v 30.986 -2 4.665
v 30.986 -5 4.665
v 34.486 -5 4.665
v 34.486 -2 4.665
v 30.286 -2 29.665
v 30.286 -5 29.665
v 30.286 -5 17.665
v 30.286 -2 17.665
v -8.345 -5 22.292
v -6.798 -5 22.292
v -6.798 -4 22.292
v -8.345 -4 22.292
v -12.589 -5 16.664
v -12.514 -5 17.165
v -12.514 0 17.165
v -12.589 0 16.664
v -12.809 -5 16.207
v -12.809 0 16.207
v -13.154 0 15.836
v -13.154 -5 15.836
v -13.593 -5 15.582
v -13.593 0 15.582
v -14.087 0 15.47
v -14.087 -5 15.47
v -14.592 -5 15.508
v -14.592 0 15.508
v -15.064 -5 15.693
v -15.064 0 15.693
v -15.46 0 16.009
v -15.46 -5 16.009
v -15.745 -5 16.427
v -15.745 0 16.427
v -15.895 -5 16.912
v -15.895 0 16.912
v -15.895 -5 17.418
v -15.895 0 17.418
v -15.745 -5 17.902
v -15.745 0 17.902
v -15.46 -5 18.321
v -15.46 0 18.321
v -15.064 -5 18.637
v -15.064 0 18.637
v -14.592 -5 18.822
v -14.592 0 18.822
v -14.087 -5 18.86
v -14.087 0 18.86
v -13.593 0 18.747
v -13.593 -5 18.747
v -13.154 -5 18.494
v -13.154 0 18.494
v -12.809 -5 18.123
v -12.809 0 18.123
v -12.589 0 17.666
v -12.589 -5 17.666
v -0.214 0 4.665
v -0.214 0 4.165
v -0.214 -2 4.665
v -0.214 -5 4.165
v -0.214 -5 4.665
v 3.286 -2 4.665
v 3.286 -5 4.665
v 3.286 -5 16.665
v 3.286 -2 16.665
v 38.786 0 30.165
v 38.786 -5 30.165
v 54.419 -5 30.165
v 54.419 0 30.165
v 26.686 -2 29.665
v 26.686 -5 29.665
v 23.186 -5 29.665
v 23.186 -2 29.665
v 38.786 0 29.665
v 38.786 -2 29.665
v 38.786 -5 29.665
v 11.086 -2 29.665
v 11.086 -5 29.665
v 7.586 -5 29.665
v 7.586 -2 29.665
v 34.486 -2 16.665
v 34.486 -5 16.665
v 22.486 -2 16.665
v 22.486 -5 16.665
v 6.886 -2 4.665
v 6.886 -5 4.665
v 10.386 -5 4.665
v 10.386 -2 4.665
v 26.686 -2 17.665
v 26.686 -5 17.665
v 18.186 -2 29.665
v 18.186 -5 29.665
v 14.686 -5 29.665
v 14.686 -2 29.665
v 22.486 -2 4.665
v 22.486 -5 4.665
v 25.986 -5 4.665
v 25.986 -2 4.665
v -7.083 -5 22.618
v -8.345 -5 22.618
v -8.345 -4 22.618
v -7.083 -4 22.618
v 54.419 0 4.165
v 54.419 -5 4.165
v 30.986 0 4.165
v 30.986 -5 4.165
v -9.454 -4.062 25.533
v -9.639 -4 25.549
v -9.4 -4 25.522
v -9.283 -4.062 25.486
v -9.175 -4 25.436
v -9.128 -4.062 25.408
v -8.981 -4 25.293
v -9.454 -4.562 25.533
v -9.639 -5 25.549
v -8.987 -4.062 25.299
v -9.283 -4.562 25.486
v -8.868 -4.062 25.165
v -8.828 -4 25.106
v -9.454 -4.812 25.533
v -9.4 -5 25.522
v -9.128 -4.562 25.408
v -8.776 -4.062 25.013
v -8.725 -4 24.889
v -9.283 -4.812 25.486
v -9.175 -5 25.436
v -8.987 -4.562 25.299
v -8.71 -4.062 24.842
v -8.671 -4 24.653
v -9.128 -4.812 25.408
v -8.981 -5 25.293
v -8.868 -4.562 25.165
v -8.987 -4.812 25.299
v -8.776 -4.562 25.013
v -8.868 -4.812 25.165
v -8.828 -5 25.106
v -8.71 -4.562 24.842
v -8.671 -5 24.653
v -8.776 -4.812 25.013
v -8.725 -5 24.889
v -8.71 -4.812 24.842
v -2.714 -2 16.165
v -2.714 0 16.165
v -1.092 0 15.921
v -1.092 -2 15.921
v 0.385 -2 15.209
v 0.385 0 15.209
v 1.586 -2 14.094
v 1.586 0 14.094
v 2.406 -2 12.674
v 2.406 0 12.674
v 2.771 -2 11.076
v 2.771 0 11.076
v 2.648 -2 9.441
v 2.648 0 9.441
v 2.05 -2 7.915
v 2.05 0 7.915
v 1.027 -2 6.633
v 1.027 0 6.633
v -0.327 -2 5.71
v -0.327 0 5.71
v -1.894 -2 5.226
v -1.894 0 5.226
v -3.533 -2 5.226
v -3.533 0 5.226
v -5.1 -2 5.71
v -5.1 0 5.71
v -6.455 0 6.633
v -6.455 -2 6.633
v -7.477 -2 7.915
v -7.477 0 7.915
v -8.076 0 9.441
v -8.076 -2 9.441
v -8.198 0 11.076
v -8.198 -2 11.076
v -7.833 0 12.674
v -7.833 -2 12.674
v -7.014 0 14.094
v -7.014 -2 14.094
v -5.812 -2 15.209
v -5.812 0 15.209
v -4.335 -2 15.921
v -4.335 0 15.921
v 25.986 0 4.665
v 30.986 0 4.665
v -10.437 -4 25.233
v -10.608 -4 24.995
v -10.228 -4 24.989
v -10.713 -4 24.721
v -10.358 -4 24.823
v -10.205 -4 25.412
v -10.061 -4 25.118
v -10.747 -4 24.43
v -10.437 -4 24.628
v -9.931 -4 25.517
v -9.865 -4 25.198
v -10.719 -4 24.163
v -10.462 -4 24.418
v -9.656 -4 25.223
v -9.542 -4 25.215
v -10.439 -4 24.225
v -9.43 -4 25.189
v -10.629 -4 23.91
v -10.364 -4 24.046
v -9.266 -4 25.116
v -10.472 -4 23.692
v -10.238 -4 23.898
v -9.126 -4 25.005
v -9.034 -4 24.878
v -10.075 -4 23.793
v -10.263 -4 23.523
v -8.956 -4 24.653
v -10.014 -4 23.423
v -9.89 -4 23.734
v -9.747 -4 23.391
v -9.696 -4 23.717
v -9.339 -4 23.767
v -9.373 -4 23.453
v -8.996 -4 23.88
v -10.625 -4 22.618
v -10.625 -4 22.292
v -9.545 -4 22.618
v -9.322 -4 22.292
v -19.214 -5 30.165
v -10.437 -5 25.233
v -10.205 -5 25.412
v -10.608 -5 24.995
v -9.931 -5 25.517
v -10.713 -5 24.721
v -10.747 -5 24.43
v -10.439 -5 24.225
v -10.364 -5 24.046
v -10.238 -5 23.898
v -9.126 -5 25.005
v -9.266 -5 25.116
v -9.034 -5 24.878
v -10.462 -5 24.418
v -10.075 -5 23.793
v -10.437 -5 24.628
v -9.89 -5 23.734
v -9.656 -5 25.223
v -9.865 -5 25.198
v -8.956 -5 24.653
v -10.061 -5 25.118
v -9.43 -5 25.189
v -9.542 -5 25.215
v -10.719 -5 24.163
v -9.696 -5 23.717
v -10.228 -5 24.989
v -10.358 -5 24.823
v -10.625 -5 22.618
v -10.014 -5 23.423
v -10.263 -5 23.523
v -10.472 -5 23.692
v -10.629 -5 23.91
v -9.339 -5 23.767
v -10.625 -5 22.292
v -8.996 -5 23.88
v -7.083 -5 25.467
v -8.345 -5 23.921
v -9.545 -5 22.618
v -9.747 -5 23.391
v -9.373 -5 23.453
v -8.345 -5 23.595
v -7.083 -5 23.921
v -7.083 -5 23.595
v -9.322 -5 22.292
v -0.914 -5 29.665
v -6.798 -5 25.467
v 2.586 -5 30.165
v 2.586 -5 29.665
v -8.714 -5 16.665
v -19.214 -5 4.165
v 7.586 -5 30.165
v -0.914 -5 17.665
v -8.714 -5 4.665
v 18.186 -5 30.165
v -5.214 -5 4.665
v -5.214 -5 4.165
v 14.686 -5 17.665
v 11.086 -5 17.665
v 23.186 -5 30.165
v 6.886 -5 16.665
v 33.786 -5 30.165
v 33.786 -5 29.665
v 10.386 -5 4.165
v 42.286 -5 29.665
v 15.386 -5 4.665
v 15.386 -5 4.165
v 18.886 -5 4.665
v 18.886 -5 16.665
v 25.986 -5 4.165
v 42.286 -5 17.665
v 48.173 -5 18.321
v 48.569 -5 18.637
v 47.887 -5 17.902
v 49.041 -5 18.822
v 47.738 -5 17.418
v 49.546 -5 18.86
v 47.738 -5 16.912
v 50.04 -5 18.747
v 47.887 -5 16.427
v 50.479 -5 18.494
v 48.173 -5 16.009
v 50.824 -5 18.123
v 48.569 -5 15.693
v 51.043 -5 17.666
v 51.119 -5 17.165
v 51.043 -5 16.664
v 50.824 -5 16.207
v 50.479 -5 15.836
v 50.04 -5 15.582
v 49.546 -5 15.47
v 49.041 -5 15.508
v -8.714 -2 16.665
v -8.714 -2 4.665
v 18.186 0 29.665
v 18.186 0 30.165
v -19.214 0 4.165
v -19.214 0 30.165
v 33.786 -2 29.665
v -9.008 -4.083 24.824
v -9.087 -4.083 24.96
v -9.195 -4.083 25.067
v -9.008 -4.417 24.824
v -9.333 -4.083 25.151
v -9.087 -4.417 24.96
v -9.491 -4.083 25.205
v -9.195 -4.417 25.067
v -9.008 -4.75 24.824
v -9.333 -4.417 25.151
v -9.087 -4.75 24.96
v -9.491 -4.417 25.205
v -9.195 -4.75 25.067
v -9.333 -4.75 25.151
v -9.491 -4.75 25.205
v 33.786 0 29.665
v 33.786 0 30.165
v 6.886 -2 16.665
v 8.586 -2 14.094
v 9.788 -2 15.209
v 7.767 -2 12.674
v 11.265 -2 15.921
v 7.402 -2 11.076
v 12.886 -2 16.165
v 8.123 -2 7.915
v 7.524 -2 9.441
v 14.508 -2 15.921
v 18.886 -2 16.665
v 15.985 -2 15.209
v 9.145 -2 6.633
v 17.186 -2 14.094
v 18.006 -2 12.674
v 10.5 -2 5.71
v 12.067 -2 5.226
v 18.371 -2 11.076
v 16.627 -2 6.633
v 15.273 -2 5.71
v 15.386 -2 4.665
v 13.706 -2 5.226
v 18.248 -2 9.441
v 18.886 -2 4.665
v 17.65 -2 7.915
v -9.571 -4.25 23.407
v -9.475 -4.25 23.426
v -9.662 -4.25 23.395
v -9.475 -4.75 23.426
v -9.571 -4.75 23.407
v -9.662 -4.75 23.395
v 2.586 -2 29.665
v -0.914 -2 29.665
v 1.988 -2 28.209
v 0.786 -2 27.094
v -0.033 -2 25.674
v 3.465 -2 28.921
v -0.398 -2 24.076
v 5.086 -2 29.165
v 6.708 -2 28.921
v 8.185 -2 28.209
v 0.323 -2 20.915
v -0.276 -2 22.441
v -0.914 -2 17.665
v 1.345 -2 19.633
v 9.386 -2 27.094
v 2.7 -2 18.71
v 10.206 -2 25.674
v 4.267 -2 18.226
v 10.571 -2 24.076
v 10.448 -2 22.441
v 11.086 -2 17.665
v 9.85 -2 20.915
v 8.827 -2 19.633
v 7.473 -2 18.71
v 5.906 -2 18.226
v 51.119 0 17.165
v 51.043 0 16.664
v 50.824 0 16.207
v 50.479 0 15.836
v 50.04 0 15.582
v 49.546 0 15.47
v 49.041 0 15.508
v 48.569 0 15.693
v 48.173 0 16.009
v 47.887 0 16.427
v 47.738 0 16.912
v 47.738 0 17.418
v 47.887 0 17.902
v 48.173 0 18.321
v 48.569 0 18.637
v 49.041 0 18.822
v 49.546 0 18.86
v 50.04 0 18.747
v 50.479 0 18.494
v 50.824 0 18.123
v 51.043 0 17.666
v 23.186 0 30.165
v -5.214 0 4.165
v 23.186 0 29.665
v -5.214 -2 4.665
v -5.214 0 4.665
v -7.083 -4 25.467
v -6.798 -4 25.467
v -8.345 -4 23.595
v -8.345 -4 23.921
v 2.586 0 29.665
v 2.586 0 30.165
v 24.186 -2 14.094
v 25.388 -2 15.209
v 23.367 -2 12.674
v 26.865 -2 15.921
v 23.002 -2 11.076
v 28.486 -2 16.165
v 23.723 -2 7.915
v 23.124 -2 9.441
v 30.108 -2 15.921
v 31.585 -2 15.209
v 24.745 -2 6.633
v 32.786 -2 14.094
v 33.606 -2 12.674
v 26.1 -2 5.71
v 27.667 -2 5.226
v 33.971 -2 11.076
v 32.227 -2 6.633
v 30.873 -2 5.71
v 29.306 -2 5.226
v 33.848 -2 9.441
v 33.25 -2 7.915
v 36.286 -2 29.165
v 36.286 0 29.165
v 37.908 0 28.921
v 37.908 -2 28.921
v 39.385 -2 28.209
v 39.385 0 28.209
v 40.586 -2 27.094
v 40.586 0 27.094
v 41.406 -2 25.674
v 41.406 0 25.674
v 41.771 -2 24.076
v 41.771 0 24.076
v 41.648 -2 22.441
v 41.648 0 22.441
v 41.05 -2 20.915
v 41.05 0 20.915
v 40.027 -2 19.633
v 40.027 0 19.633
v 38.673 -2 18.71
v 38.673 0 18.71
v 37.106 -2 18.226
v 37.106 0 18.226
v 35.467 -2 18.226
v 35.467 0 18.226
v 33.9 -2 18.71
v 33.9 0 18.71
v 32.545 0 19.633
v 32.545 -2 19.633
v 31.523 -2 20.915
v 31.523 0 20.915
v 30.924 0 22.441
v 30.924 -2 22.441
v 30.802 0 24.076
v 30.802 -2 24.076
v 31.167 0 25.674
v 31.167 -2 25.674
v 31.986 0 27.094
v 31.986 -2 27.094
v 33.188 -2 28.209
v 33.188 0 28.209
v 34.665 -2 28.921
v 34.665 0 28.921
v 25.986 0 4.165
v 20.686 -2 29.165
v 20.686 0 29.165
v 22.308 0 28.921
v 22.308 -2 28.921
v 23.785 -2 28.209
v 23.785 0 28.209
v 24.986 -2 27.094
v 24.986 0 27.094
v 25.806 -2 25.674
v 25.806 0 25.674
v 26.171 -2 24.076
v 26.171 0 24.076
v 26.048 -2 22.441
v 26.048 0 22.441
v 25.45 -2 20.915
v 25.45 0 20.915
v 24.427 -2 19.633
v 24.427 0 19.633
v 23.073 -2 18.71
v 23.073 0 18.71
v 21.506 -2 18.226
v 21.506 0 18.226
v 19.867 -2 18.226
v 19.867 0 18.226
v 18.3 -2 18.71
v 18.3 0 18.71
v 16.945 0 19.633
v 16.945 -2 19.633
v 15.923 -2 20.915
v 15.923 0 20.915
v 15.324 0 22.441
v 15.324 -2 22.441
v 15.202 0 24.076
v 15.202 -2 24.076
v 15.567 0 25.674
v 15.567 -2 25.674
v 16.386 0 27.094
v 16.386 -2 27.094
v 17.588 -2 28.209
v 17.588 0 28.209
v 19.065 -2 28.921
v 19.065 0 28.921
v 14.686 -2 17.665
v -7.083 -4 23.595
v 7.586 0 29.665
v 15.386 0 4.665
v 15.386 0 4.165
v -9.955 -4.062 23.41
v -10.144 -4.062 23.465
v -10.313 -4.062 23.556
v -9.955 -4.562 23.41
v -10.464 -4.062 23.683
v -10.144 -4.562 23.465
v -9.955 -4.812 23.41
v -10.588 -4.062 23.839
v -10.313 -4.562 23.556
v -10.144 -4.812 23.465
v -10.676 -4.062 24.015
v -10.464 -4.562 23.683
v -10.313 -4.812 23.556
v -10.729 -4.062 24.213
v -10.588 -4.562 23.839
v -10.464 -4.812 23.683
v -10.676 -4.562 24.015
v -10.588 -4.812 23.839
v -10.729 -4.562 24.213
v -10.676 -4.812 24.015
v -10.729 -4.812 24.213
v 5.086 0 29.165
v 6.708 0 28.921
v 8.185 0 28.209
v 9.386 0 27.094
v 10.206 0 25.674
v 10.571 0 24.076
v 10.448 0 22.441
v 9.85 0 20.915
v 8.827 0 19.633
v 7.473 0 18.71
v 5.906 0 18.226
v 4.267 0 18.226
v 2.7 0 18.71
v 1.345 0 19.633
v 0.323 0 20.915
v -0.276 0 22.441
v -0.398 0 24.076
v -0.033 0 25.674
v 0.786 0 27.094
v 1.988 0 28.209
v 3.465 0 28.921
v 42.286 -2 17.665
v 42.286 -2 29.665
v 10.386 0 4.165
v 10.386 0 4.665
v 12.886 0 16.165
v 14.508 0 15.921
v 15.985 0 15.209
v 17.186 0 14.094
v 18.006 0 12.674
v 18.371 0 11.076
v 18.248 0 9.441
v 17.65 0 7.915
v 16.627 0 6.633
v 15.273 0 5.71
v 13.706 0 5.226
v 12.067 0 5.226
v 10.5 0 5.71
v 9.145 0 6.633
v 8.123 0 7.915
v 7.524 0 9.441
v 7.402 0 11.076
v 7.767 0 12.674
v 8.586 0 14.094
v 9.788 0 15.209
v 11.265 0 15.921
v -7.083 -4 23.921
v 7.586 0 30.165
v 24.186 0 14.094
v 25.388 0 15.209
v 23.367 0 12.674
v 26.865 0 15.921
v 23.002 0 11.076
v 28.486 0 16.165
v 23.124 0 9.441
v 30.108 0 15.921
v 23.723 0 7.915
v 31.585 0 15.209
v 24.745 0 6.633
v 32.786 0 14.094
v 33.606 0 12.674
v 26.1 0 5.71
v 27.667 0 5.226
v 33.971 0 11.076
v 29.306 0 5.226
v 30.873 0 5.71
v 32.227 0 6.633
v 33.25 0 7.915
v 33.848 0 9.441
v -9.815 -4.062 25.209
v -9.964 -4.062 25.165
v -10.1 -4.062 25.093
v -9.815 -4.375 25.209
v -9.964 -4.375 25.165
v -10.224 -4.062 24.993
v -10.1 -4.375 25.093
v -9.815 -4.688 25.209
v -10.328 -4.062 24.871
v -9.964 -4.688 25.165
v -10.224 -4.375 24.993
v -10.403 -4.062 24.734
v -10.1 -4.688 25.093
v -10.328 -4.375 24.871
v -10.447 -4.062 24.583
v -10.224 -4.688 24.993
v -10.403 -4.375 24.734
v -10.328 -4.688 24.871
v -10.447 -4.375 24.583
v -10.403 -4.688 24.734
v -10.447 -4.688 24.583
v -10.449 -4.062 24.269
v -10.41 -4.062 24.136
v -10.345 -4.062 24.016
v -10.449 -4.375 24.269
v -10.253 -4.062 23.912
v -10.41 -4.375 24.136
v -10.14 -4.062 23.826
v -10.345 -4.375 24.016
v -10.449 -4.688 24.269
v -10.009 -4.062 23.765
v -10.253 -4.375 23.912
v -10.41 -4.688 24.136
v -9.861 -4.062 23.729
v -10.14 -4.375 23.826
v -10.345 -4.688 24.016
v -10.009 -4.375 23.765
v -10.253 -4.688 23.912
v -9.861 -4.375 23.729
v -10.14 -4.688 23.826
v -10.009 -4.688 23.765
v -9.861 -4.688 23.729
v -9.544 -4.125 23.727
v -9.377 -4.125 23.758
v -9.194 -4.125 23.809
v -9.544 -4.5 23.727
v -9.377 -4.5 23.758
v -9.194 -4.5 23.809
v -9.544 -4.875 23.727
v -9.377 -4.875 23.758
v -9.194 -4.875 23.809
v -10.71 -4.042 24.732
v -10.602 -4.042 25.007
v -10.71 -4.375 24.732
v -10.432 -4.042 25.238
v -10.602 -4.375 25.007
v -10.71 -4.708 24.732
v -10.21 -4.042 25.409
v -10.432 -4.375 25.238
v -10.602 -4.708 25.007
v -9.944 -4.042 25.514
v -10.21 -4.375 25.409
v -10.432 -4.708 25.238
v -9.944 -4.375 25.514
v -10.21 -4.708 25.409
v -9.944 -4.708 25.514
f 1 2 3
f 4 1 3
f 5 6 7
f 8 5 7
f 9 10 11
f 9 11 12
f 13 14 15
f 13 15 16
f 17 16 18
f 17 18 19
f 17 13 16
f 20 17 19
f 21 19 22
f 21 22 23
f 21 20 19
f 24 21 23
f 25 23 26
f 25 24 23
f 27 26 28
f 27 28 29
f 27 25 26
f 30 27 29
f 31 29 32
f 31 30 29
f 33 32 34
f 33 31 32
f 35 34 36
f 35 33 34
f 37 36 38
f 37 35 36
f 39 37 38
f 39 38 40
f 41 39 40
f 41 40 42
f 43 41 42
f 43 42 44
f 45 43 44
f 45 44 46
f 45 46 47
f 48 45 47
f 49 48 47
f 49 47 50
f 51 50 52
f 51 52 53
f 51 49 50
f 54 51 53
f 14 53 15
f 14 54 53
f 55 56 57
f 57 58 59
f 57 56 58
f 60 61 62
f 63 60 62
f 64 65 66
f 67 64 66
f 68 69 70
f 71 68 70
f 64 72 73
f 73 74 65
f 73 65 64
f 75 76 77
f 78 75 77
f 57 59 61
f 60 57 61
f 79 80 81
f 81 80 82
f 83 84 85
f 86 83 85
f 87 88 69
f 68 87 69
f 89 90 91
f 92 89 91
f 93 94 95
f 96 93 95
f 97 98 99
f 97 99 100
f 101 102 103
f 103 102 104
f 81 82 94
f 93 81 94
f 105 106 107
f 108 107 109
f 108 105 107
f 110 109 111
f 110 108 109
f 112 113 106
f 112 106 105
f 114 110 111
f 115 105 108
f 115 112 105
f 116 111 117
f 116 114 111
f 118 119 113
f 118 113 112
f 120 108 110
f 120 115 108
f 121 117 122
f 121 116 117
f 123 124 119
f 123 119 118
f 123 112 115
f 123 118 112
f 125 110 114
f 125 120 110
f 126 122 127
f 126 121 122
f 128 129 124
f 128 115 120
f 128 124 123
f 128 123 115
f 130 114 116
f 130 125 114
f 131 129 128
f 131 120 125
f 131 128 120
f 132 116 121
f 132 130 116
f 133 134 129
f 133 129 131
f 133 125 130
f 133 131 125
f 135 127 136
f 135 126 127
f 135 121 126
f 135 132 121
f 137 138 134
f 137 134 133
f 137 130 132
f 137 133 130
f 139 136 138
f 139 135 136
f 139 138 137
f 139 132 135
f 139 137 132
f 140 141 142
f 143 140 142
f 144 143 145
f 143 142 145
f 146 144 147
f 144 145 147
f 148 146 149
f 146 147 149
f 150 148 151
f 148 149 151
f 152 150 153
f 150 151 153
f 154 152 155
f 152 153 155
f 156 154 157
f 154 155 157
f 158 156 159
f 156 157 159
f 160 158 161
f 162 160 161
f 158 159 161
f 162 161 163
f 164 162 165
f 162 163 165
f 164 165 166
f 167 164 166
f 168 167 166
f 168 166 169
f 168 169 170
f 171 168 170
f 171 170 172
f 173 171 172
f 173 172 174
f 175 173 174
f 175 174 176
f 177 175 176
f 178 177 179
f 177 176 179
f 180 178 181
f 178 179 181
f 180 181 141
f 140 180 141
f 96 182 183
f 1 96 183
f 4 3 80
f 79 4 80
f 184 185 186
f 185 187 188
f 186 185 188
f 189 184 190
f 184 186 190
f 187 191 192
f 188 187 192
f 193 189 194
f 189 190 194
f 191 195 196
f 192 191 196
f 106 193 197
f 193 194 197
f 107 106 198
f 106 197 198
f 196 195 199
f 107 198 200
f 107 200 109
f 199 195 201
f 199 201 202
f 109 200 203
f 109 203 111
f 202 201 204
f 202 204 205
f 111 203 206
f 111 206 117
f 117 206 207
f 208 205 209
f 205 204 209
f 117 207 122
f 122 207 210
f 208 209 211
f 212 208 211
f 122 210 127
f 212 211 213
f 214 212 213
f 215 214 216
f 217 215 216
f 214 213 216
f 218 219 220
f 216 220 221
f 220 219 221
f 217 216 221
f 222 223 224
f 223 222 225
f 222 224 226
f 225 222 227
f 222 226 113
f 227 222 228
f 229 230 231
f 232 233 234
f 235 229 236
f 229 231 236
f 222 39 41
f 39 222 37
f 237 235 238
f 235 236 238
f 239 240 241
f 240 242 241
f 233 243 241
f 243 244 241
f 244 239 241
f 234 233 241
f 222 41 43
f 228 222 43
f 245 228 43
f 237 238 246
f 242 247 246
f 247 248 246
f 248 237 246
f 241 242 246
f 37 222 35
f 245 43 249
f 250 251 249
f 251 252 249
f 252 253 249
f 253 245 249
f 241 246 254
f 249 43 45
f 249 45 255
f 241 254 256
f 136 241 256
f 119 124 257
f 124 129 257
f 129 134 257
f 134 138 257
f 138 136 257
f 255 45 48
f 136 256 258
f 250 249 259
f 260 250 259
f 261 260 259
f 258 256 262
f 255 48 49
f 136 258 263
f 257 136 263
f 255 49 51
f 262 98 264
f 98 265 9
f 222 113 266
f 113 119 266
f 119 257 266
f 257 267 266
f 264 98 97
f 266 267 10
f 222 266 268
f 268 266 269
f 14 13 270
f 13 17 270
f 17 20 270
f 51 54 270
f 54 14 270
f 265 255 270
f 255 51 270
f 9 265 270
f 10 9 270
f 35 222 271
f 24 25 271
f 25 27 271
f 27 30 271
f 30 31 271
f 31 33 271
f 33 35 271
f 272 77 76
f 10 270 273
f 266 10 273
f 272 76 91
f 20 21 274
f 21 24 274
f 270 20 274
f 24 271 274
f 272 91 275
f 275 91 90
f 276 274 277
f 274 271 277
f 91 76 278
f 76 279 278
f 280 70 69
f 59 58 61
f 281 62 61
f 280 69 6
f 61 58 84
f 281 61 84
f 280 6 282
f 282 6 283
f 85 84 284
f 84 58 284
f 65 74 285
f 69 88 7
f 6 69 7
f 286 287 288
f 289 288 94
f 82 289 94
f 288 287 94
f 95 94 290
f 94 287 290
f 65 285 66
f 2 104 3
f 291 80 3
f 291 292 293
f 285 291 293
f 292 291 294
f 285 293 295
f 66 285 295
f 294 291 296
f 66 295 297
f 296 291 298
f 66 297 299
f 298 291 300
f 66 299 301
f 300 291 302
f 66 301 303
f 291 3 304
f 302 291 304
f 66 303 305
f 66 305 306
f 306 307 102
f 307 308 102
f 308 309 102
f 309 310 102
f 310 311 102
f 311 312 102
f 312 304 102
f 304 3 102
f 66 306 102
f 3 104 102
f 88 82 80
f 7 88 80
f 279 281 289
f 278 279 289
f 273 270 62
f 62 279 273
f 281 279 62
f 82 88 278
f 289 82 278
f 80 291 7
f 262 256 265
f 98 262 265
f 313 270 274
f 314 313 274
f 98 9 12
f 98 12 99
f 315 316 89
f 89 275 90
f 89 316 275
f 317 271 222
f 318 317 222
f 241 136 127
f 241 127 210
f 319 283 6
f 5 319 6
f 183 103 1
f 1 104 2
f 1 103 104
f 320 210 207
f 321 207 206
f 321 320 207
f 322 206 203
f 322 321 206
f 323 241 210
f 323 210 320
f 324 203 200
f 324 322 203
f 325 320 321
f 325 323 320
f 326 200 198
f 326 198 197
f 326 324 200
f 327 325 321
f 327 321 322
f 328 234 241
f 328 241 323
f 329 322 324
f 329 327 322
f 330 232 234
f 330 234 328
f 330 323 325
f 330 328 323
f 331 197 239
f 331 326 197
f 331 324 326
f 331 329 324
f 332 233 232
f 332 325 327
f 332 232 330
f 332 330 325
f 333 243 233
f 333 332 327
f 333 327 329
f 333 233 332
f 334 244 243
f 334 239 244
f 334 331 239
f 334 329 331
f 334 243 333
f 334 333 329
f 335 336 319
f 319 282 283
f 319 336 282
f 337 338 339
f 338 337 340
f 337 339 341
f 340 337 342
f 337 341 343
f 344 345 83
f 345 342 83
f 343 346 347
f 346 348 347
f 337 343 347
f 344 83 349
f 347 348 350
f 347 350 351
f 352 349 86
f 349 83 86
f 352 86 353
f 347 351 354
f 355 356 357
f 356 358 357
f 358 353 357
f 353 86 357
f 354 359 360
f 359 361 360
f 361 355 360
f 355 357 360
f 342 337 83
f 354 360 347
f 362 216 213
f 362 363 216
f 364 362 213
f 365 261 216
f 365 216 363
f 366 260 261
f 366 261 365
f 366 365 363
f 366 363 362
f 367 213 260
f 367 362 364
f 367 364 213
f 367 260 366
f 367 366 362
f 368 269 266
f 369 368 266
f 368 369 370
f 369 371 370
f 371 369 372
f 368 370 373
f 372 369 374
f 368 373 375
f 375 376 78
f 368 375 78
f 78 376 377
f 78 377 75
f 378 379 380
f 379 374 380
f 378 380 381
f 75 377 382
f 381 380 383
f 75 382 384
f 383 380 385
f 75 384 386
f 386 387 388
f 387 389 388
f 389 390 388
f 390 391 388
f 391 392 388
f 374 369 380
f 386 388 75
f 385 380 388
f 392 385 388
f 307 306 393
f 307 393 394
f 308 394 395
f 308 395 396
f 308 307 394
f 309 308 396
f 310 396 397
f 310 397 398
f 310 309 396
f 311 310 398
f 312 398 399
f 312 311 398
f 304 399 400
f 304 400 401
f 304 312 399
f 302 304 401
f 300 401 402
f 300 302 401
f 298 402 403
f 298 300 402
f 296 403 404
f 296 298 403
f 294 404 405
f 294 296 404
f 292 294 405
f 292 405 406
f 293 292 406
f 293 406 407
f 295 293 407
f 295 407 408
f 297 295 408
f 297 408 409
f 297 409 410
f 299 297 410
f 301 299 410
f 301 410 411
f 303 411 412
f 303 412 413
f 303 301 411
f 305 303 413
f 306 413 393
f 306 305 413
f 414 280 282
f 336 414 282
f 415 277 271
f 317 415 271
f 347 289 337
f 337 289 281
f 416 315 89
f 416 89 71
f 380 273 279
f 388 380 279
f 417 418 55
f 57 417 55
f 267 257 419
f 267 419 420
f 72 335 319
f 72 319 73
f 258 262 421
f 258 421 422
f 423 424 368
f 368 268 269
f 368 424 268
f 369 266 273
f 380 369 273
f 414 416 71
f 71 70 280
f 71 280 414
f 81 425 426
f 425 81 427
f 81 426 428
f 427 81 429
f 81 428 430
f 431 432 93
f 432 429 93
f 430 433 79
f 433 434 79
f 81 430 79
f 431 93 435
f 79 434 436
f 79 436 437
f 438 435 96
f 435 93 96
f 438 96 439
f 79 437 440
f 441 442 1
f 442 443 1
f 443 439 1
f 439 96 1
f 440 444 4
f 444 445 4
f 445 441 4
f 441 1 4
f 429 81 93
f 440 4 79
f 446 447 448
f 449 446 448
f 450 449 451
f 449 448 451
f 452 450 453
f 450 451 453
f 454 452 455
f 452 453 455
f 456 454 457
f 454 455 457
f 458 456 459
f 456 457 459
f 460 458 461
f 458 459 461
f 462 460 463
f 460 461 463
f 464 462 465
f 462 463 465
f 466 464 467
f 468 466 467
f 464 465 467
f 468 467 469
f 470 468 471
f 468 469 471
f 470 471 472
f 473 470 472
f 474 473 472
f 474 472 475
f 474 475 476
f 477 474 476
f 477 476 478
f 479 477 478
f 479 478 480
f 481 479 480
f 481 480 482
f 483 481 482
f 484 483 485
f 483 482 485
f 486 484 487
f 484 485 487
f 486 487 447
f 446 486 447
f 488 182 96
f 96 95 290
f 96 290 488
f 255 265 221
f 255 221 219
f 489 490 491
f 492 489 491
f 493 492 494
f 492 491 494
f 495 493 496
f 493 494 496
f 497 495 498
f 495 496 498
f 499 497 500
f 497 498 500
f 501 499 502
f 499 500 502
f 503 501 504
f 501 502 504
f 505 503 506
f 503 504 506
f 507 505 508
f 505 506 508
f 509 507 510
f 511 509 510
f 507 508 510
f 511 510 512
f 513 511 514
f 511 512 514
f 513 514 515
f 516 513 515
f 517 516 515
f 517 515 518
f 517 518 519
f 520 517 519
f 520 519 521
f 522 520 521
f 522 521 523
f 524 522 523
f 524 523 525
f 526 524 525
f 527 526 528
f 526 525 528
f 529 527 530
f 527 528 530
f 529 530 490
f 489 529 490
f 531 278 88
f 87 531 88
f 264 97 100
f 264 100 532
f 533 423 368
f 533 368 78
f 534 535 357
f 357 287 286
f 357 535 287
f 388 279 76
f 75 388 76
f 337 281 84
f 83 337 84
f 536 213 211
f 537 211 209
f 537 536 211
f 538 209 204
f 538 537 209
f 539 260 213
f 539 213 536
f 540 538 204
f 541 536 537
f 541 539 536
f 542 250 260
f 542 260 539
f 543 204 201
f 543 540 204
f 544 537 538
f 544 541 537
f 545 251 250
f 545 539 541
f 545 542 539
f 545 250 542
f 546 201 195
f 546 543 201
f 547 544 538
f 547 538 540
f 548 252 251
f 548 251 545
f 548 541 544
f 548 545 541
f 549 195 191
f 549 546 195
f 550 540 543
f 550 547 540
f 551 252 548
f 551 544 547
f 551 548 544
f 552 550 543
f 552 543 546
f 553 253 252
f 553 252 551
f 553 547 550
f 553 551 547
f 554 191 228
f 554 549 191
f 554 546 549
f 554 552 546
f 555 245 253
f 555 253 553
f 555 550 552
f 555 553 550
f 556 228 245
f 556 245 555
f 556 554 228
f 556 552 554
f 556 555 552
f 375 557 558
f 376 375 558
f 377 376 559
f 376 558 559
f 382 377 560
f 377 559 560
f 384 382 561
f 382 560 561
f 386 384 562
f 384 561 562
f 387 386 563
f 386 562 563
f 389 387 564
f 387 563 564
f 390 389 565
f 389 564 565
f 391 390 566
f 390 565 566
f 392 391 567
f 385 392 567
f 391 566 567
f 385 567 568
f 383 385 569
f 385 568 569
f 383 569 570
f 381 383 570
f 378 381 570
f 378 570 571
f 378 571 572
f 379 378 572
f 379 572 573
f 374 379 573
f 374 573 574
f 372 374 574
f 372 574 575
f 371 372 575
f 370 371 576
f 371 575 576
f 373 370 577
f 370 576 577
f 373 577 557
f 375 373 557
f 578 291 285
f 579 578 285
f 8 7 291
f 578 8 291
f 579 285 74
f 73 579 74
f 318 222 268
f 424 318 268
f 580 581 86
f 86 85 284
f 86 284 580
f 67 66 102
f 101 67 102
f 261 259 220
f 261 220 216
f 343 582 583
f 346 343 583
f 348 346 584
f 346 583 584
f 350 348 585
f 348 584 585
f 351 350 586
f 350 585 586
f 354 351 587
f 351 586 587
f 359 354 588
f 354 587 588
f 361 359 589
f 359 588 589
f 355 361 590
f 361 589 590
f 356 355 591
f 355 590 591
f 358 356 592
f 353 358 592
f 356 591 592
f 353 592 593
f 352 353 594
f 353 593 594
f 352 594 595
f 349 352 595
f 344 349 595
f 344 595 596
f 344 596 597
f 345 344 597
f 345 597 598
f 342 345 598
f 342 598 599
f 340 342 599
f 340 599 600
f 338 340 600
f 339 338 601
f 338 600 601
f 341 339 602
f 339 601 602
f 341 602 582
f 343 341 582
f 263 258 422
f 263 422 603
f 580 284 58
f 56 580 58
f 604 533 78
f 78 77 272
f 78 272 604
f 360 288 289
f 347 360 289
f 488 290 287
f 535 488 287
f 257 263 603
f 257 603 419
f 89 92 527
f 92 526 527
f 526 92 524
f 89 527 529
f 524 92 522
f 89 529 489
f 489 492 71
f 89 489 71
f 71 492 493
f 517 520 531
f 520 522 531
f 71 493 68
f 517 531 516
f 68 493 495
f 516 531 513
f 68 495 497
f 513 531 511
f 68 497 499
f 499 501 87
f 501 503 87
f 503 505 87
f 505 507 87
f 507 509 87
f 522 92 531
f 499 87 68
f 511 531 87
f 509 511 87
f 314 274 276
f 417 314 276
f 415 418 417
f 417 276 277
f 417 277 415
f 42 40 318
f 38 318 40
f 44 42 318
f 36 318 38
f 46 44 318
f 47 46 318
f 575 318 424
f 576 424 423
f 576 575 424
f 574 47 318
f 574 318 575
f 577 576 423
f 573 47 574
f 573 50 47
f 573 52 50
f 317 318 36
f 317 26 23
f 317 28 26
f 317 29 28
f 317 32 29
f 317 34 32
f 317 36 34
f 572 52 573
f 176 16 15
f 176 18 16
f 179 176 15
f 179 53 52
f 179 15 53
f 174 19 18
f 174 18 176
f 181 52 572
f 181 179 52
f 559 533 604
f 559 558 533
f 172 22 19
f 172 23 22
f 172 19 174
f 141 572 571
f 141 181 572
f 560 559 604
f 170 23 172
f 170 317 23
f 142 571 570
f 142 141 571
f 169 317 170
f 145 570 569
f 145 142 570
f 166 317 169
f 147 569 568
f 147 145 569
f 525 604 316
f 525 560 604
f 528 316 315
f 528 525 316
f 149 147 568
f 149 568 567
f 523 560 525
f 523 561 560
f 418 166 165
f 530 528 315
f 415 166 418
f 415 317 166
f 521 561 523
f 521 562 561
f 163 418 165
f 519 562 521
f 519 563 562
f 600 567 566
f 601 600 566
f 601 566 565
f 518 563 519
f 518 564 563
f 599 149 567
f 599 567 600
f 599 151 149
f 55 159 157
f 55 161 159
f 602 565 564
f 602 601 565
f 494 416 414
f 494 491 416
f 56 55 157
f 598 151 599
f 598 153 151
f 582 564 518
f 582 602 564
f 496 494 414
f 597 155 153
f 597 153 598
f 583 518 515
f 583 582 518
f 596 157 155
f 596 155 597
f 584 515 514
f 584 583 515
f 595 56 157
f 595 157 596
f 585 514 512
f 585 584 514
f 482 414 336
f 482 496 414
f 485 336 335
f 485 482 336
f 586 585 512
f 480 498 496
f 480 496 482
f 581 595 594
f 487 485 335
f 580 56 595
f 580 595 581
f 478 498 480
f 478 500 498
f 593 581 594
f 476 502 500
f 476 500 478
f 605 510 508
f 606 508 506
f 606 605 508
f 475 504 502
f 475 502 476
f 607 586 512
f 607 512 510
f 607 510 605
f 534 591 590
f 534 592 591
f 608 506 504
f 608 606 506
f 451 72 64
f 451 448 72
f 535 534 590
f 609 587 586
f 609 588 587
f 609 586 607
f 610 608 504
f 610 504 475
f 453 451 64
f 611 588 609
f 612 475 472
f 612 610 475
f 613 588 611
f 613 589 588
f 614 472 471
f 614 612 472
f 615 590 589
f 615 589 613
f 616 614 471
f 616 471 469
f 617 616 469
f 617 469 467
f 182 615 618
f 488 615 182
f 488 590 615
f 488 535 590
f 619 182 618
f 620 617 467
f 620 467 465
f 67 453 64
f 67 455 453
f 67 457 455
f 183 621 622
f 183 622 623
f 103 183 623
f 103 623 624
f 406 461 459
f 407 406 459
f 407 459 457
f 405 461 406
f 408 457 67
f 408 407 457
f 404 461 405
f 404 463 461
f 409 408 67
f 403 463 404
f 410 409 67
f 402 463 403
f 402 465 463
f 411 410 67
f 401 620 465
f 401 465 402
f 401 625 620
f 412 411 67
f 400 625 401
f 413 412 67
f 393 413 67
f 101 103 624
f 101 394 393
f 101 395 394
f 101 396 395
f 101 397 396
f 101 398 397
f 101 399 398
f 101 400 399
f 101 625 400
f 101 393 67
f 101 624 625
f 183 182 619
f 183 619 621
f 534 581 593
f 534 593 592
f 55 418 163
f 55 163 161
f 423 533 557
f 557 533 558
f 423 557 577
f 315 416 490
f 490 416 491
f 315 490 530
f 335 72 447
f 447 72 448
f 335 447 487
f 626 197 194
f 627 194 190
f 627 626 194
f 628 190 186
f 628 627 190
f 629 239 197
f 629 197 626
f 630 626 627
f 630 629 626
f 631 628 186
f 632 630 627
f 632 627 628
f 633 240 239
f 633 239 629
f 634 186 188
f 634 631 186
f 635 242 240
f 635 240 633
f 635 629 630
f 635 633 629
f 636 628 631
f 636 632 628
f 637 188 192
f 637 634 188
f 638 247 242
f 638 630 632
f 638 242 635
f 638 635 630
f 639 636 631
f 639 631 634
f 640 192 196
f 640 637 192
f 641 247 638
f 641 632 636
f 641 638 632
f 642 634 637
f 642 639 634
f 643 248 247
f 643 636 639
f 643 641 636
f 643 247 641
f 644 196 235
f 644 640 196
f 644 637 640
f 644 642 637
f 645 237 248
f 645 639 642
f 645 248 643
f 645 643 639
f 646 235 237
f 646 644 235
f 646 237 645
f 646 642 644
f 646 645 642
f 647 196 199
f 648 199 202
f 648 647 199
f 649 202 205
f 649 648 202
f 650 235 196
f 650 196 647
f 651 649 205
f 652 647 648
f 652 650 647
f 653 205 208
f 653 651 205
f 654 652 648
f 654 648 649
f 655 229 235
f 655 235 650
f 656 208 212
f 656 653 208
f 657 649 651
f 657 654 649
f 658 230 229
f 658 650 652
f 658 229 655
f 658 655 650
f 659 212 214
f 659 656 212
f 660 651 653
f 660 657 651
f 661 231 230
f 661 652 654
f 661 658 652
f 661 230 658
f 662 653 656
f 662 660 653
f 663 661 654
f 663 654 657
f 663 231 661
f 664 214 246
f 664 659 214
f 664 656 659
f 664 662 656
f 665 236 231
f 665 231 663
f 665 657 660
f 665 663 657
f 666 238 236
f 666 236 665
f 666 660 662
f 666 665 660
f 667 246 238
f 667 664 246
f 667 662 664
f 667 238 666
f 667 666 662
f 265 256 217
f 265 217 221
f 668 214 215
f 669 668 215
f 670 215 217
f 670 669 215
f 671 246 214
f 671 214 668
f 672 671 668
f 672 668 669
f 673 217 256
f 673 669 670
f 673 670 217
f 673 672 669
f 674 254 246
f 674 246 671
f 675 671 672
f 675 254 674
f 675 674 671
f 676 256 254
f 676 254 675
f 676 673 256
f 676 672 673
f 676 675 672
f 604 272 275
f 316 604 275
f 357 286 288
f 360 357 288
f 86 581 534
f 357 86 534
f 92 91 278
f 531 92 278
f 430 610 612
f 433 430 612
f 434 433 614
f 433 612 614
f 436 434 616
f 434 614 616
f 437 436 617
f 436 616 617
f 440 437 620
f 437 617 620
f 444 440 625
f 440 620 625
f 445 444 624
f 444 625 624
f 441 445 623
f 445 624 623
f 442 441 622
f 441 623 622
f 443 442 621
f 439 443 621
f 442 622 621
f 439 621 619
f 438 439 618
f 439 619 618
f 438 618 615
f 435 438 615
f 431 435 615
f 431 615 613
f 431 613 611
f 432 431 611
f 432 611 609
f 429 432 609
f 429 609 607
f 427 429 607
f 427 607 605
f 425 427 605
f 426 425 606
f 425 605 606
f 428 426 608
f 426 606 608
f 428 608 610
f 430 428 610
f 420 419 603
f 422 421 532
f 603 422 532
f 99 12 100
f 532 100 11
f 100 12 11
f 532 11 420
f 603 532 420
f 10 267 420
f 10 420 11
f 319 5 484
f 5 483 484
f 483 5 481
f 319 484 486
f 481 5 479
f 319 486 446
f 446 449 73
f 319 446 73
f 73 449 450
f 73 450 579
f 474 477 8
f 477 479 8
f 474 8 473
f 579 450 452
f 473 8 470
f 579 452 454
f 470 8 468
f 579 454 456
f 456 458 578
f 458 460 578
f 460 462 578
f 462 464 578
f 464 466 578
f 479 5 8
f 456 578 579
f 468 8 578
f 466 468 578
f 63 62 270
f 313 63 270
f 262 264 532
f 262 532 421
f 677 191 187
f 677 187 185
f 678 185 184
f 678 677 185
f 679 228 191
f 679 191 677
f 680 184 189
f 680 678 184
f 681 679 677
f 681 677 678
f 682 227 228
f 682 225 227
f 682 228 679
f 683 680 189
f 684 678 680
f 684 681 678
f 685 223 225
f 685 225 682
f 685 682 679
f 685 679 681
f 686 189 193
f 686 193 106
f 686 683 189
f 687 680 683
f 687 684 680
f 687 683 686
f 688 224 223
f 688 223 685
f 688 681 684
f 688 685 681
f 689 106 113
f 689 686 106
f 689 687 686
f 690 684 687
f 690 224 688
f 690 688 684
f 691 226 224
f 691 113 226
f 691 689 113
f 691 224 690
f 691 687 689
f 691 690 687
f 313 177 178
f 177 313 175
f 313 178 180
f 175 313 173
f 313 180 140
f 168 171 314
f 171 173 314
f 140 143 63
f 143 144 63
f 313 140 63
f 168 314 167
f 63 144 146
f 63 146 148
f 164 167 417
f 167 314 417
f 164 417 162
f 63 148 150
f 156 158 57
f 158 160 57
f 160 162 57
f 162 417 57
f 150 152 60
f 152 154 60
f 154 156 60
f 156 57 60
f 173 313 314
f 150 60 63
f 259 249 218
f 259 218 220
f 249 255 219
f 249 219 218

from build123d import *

# Parameters (mm, degrees)
SKETCH1_W             = 12
SKETCH1_H             = 12
SKETCH1_R             = 5.5
BOSS_EXTRUDE1_DEPTH   = 2
BOSS_EXTRUDE1_2_DEPTH = 2
BOSS_EXTRUDE1_3_DEPTH = 2
BOSS_EXTRUDE1_4_DEPTH = 2
BOSS_EXTRUDE1_5_DEPTH = 2
BOSS_EXTRUDE1_6_DEPTH = 2
SKETCH1_3_R           = 1.7
BOSS_EXTRUDE2_DEPTH   = 5
CUT_EXTRUDE1_DEPTH    = 1


with BuildPart() as part:
    # Sketch1 → Boss-Extrude1 (new body)
    with BuildSketch(Plane(origin=(0, 0, 0), x_dir=(1, 0, 0), z_dir=(0, 1, 0))):
        with Locations((-2.713611414, -10.664883528)):
            Rectangle(SKETCH1_W, SKETCH1_H)
        with Locations((-2.713611414, -10.664883528)):
            Circle(SKETCH1_R, mode=Mode.SUBTRACT)
    extrude(amount=-BOSS_EXTRUDE1_DEPTH)



with BuildPart() as body_2:
    # Sketch1 → Boss-Extrude1 2 (new body)
    with BuildSketch(Plane(origin=(0, 0, 0), x_dir=(1, 0, 0), z_dir=(0, 1, 0))):
        with Locations((12.886388586, -10.664882884)):
            Rectangle(SKETCH1_W, SKETCH1_H)
        with Locations((12.886388586, -10.664882884)):
            Circle(SKETCH1_R, mode=Mode.SUBTRACT)
    extrude(amount=-BOSS_EXTRUDE1_2_DEPTH)


with BuildPart() as body_3:
    # Sketch1 → Boss-Extrude1 3 (new body)
    with BuildSketch(Plane(origin=(0, 0, 0), x_dir=(1, 0, 0), z_dir=(0, 1, 0))):
        with Locations((5.086388588, -23.66488245)):
            Rectangle(SKETCH1_W, SKETCH1_H)
        with Locations((5.086388588, -23.66488245)):
            Circle(SKETCH1_R, mode=Mode.SUBTRACT)
    extrude(amount=-BOSS_EXTRUDE1_3_DEPTH)


with BuildPart() as body_4:
    # Sketch1 → Boss-Extrude1 4 (new body)
    with BuildSketch(Plane(origin=(0, 0, 0), x_dir=(1, 0, 0), z_dir=(0, 1, 0))):
        with Locations((20.686388588, -23.664882884)):
            Rectangle(SKETCH1_W, SKETCH1_H)
        with Locations((20.686388588, -23.664882884)):
            Circle(SKETCH1_R, mode=Mode.SUBTRACT)
    extrude(amount=-BOSS_EXTRUDE1_4_DEPTH)


with BuildPart() as body_5:
    # Sketch1 → Boss-Extrude1 5 (new body)
    with BuildSketch(Plane(origin=(0, 0, 0), x_dir=(1, 0, 0), z_dir=(0, 1, 0))):
        with Locations((28.486388586, -10.664882884)):
            Rectangle(SKETCH1_W, SKETCH1_H)
        with Locations((28.486388586, -10.664882884)):
            Circle(SKETCH1_R, mode=Mode.SUBTRACT)
    extrude(amount=-BOSS_EXTRUDE1_5_DEPTH)


with BuildPart() as body_6:
    # Sketch1 → Boss-Extrude1 6 (new body)
    with BuildSketch(Plane(origin=(0, 0, 0), x_dir=(1, 0, 0), z_dir=(0, 1, 0))):
        with Locations((36.286388588, -23.664883087)):
            Rectangle(SKETCH1_W, SKETCH1_H)
        with Locations((36.286388588, -23.664883087)):
            Circle(SKETCH1_R, mode=Mode.SUBTRACT)
    extrude(amount=-BOSS_EXTRUDE1_6_DEPTH)


with BuildPart() as part_1:
    add(part.part)

    add(body_2.part)  # Boss-Extrude2 merges body 2

    add(body_3.part)  # Boss-Extrude2 merges body 3

    add(body_4.part)  # Boss-Extrude2 merges body 4

    add(body_5.part)  # Boss-Extrude2 merges body 5

    add(body_6.part)  # Boss-Extrude2 merges body 6
    # Sketch1<3> → Boss-Extrude2 (add)
    with BuildSketch(Plane(origin=(0, 0, 0), x_dir=(1, 0, 0), z_dir=(0, 1, 0))):
        Polygon((6.386388586, -4.164882884), (3.786388586, -4.164883528), (-0.213611414, -4.164883528), (-0.213611414, -4.664883528), (3.286388586, -4.664883528), (3.286388586, -16.664883528), (-8.713611414, -16.664883528), (-8.713611414, -4.664883528), (-5.213611414, -4.664883528), (-5.213611414, -4.164883528), (-19.213611414, -4.164883528), (-19.213611414, -30.16488245), (2.586388588, -30.16488245), (2.586388588, -29.66488245), (-0.913611412, -29.66488245), (-0.913611412, -17.66488245), (11.086388588, -17.66488245), (11.086388588, -29.66488245), (7.586388588, -29.66488245), (7.586388588, -30.16488245), (11.586388588, -30.16488245), (14.186388588, -30.164882884), (18.186388588, -30.164882884), (18.186388588, -29.664882884), (14.686388588, -29.664882884), (14.686388588, -17.664882884), (26.686388588, -17.664882884), (26.686388588, -29.664882884), (23.186388588, -29.664882884), (23.186388588, -30.164882884), (27.186388588, -30.164882884), (29.786388588, -30.164883087), (33.786388588, -30.164883087), (33.786388588, -29.664883087), (30.286388588, -29.664883087), (30.286388588, -17.664883087), (42.286388588, -17.664883087), (42.286388588, -29.664883087), (38.786388588, -29.664883087), (38.786388588, -30.164883087), (42.786388588, -30.164883087), (54.418988347, -30.16488245), (54.418988347, -4.164883528), (34.986388586, -4.164882884), (30.986388586, -4.164882884), (30.986388586, -4.664882884), (34.486388586, -4.664882884), (34.486388586, -16.664882884), (22.486388586, -16.664882884), (22.486388586, -4.664882884), (25.986388586, -4.664882884), (25.986388586, -4.164882884), (15.386388586, -4.164882884), (15.386388586, -4.664882884), (18.886388586, -4.664882884), (18.886388586, -16.664882884), (6.886388586, -16.664882884), (6.886388586, -4.664882884), (10.386388586, -4.664882884), (10.386388586, -4.164882884), align=None)
        with Locations((-14.213611414, -17.164882989)):
            Circle(SKETCH1_3_R, mode=Mode.SUBTRACT)
        with Locations((49.418988347, -17.164882989)):
            Circle(SKETCH1_3_R, mode=Mode.SUBTRACT)
    extrude(amount=-BOSS_EXTRUDE2_DEPTH)

    # Sketch2 → Cut-Extrude1 (cut)
    with BuildSketch(Plane(origin=(0, -5, 0), x_dir=(-1, 0, 0), z_dir=(0, -1, 0))):
        Polygon((6.798219501, -22.292392997), (8.345014372, -22.292392997), (8.345014372, -22.618034023), (7.083155398, -22.618034023), (7.083155398, -23.5949571), (8.345014372, -23.5949571), (8.345014372, -23.920598125), (7.083155398, -23.920598125), (7.083155398, -25.467392997), (6.798219501, -25.467392997), align=None)
        with BuildLine():
            Line((10.624501552, -22.292392997), (10.624501552, -22.618034023))
            Line((10.624501552, -22.618034023), (9.545179637, -22.618034023))
            Line((9.545179637, -22.618034023), (9.373454877, -23.453125169))
            add(Edge.make_bspline(
                [(9.373454877, -23.453125169), (9.407069849, -23.443844851), (9.47219354, -23.425865702), (9.568314271, -23.405903325), (9.65956577, -23.393869672), (9.718779856, -23.392226555), (9.747433243, -23.391431459)],
                knots=[0, 0, 0, 0, 1.100273476, 2.13160584, 3.095893838, 4, 4, 4, 4], degree=3))
            add(Edge.make_bspline(
                [(9.747433243, -23.391431459), (9.782887778, -23.392198843), (9.852600253, -23.393707713), (9.95459844, -23.408196462), (10.051964708, -23.431001956), (10.144495429, -23.462861287), (10.232361786, -23.50360083), (10.314755359, -23.55449149), (10.392912895, -23.613939584), (10.465432248, -23.682288273), (10.531222156, -23.757510025), (10.589067018, -23.838388951), (10.638200225, -23.924139045), (10.677716053, -24.015579597), (10.709270413, -24.111699686), (10.73027258, -24.213510672), (10.744257737, -24.320052895), (10.745820188, -24.392900612), (10.746616936, -24.430048246)],
                knots=[0, 0, 0, 0, 1.052922333, 2.070308379, 3.05430497, 4.020497103, 4.973039431, 5.925935799, 6.892292201, 7.88610001, 8.88166317, 9.857072816, 10.836096531, 11.812156883, 12.81219415, 13.836441305, 14.89672472, 16, 16, 16, 16], degree=3))
            add(Edge.make_bspline(
                [(10.746616936, -24.430048246), (10.746013618, -24.455921974), (10.744815135, -24.50731977), (10.738720416, -24.583650581), (10.726985874, -24.658365436), (10.711230867, -24.731474249), (10.690781673, -24.802838608), (10.666026603, -24.87266278), (10.635731635, -24.940512173), (10.602501745, -25.007028781), (10.565085297, -25.070708856), (10.523557651, -25.130261865), (10.479683241, -25.186581177), (10.43247427, -25.239062778), (10.381491939, -25.287361801), (10.327353683, -25.331764885), (10.270491502, -25.373022949), (10.210025675, -25.409461241), (10.147303566, -25.442991922), (10.081419397, -25.470499703), (10.013872905, -25.495092824), (9.94369191, -25.514695753), (9.87103538, -25.530055999), (9.795783548, -25.540488687), (9.718331083, -25.548087312), (9.665830179, -25.548562979), (9.639310246, -25.548803254)],
                knots=[0, 0, 0, 0, 1.056347294, 2.098418968, 3.122841568, 4.141288669, 5.149314143, 6.15115421, 7.162517403, 8.180376062, 9.185164535, 10.17417709, 11.141909838, 12.097768115, 13.052685741, 14.0056014, 14.954263652, 15.917497458, 16.885230207, 17.854509472, 18.828990115, 19.81800267, 20.826176721, 21.857883937, 22.917946725, 24, 24, 24, 24], degree=3))
            add(Edge.make_bspline(
                [(9.639310246, -25.548803254), (9.607674382, -25.548176565), (9.545434557, -25.546943629), (9.454248042, -25.534045431), (9.366514079, -25.51557245), (9.282938915, -25.487780977), (9.202773555, -25.452958217), (9.127097232, -25.408947118), (9.053976278, -25.359073217), (8.986383216, -25.300217468), (8.923648742, -25.235886814), (8.867490695, -25.166075239), (8.817476664, -25.09193496), (8.774407565, -25.01310592), (8.737670075, -24.929795253), (8.708809335, -24.841690816), (8.685515399, -24.749252955), (8.675660725, -24.685613699), (8.670655398, -24.653290433)],
                knots=[0, 0, 0, 0, 1.0467383, 2.05933395, 3.04377827, 4.011590433, 4.970194871, 5.932262533, 6.905835911, 7.896367577, 8.894135286, 9.877477877, 10.858688626, 11.851381753, 12.8477658, 13.868841284, 14.917554742, 16, 16, 16, 16], degree=3))
            Line((8.670655398, -24.653290433), (8.955591295, -24.653290433))
            add(Edge.make_bspline(
                [(8.955591295, -24.653290433), (8.962602201, -24.683567644), (8.976077551, -24.741762123), (9.005655623, -24.823524126), (9.041819667, -24.896385136), (9.084822183, -24.961308972), (9.13612114, -25.017922848), (9.19465855, -25.068375469), (9.26028827, -25.113891479), (9.333216414, -25.151830703), (9.410153993, -25.184187358), (9.490678534, -25.205733539), (9.572597477, -25.220883634), (9.628004284, -25.22240016), (9.655846704, -25.223162228)],
                knots=[0, 0, 0, 0, 1.136247022, 2.183929868, 3.172523383, 4.106158343, 5.02341133, 5.958108904, 6.928429099, 7.938127109, 8.96079061, 9.975095812, 10.982467395, 12, 12, 12, 12], degree=3))
            add(Edge.make_bspline(
                [(9.655846704, -25.223162228), (9.683023293, -25.222417665), (9.736534219, -25.220951615), (9.815284548, -25.209667654), (9.891314798, -25.192289), (9.963874758, -25.166281346), (10.034234154, -25.134672208), (10.100613217, -25.094109247), (10.164932256, -25.047427659), (10.225192063, -24.993945573), (10.280382135, -24.935008778), (10.329146616, -24.871982857), (10.369765673, -24.804748289), (10.4039959, -24.734469072), (10.429988536, -24.660374952), (10.448531426, -24.582813172), (10.459419915, -24.501592154), (10.460917771, -24.446193566), (10.461681039, -24.417963911)],
                knots=[0, 0, 0, 0, 1.027316725, 2.022795036, 3.002884548, 3.971462791, 4.93288096, 5.914575861, 6.907176829, 7.935150275, 8.956128384, 9.956726525, 10.942570165, 11.921478529, 12.907843606, 13.90538589, 14.932640048, 16, 16, 16, 16], degree=3))
            add(Edge.make_bspline(
                [(10.461681039, -24.417963911), (10.461083704, -24.392495193), (10.459914506, -24.342643802), (10.450361774, -24.269710237), (10.433745664, -24.20070112), (10.410682573, -24.135283207), (10.381400448, -24.073394799), (10.345617007, -24.014972023), (10.302660711, -23.960784903), (10.25359164, -23.910808086), (10.199836132, -23.864684521), (10.140469308, -23.825365243), (10.076733517, -23.79228726), (10.009396666, -23.76374129), (9.93685708, -23.743239186), (9.860551277, -23.72784689), (9.779655264, -23.718942953), (9.72434614, -23.717707526), (9.695915815, -23.717072484)],
                knots=[0, 0, 0, 0, 1.045622112, 2.046656509, 3.013763289, 3.955457236, 4.890082067, 5.820317437, 6.762574623, 7.722996705, 8.69280354, 9.665887285, 10.63943826, 11.638615906, 12.663482002, 13.728887084, 14.832589034, 16, 16, 16, 16], degree=3))
            add(Edge.make_bspline(
                [(9.695915815, -23.717072484), (9.671306001, -23.717599164), (9.620492978, -23.718686622), (9.5425487, -23.726693516), (9.460641208, -23.73961059), (9.375084487, -23.757378115), (9.285621598, -23.780629163), (9.192441334, -23.808491603), (9.095347778, -23.841803701), (9.0299267, -23.866960781), (8.996296424, -23.879892997)],
                knots=[0, 0, 0, 0, 0.817624296, 1.688186739, 2.600797293, 3.572016777, 4.590301741, 5.671205678, 6.80286297, 8, 8, 8, 8], degree=3))
            Line((8.996296424, -23.879892997), (9.321937449, -22.292392997))
            Line((9.321937449, -22.292392997), (10.624501552, -22.292392997))
        make_face()
    extrude(amount=-CUT_EXTRUDE1_DEPTH, mode=Mode.SUBTRACT)


solid = part_1.part
